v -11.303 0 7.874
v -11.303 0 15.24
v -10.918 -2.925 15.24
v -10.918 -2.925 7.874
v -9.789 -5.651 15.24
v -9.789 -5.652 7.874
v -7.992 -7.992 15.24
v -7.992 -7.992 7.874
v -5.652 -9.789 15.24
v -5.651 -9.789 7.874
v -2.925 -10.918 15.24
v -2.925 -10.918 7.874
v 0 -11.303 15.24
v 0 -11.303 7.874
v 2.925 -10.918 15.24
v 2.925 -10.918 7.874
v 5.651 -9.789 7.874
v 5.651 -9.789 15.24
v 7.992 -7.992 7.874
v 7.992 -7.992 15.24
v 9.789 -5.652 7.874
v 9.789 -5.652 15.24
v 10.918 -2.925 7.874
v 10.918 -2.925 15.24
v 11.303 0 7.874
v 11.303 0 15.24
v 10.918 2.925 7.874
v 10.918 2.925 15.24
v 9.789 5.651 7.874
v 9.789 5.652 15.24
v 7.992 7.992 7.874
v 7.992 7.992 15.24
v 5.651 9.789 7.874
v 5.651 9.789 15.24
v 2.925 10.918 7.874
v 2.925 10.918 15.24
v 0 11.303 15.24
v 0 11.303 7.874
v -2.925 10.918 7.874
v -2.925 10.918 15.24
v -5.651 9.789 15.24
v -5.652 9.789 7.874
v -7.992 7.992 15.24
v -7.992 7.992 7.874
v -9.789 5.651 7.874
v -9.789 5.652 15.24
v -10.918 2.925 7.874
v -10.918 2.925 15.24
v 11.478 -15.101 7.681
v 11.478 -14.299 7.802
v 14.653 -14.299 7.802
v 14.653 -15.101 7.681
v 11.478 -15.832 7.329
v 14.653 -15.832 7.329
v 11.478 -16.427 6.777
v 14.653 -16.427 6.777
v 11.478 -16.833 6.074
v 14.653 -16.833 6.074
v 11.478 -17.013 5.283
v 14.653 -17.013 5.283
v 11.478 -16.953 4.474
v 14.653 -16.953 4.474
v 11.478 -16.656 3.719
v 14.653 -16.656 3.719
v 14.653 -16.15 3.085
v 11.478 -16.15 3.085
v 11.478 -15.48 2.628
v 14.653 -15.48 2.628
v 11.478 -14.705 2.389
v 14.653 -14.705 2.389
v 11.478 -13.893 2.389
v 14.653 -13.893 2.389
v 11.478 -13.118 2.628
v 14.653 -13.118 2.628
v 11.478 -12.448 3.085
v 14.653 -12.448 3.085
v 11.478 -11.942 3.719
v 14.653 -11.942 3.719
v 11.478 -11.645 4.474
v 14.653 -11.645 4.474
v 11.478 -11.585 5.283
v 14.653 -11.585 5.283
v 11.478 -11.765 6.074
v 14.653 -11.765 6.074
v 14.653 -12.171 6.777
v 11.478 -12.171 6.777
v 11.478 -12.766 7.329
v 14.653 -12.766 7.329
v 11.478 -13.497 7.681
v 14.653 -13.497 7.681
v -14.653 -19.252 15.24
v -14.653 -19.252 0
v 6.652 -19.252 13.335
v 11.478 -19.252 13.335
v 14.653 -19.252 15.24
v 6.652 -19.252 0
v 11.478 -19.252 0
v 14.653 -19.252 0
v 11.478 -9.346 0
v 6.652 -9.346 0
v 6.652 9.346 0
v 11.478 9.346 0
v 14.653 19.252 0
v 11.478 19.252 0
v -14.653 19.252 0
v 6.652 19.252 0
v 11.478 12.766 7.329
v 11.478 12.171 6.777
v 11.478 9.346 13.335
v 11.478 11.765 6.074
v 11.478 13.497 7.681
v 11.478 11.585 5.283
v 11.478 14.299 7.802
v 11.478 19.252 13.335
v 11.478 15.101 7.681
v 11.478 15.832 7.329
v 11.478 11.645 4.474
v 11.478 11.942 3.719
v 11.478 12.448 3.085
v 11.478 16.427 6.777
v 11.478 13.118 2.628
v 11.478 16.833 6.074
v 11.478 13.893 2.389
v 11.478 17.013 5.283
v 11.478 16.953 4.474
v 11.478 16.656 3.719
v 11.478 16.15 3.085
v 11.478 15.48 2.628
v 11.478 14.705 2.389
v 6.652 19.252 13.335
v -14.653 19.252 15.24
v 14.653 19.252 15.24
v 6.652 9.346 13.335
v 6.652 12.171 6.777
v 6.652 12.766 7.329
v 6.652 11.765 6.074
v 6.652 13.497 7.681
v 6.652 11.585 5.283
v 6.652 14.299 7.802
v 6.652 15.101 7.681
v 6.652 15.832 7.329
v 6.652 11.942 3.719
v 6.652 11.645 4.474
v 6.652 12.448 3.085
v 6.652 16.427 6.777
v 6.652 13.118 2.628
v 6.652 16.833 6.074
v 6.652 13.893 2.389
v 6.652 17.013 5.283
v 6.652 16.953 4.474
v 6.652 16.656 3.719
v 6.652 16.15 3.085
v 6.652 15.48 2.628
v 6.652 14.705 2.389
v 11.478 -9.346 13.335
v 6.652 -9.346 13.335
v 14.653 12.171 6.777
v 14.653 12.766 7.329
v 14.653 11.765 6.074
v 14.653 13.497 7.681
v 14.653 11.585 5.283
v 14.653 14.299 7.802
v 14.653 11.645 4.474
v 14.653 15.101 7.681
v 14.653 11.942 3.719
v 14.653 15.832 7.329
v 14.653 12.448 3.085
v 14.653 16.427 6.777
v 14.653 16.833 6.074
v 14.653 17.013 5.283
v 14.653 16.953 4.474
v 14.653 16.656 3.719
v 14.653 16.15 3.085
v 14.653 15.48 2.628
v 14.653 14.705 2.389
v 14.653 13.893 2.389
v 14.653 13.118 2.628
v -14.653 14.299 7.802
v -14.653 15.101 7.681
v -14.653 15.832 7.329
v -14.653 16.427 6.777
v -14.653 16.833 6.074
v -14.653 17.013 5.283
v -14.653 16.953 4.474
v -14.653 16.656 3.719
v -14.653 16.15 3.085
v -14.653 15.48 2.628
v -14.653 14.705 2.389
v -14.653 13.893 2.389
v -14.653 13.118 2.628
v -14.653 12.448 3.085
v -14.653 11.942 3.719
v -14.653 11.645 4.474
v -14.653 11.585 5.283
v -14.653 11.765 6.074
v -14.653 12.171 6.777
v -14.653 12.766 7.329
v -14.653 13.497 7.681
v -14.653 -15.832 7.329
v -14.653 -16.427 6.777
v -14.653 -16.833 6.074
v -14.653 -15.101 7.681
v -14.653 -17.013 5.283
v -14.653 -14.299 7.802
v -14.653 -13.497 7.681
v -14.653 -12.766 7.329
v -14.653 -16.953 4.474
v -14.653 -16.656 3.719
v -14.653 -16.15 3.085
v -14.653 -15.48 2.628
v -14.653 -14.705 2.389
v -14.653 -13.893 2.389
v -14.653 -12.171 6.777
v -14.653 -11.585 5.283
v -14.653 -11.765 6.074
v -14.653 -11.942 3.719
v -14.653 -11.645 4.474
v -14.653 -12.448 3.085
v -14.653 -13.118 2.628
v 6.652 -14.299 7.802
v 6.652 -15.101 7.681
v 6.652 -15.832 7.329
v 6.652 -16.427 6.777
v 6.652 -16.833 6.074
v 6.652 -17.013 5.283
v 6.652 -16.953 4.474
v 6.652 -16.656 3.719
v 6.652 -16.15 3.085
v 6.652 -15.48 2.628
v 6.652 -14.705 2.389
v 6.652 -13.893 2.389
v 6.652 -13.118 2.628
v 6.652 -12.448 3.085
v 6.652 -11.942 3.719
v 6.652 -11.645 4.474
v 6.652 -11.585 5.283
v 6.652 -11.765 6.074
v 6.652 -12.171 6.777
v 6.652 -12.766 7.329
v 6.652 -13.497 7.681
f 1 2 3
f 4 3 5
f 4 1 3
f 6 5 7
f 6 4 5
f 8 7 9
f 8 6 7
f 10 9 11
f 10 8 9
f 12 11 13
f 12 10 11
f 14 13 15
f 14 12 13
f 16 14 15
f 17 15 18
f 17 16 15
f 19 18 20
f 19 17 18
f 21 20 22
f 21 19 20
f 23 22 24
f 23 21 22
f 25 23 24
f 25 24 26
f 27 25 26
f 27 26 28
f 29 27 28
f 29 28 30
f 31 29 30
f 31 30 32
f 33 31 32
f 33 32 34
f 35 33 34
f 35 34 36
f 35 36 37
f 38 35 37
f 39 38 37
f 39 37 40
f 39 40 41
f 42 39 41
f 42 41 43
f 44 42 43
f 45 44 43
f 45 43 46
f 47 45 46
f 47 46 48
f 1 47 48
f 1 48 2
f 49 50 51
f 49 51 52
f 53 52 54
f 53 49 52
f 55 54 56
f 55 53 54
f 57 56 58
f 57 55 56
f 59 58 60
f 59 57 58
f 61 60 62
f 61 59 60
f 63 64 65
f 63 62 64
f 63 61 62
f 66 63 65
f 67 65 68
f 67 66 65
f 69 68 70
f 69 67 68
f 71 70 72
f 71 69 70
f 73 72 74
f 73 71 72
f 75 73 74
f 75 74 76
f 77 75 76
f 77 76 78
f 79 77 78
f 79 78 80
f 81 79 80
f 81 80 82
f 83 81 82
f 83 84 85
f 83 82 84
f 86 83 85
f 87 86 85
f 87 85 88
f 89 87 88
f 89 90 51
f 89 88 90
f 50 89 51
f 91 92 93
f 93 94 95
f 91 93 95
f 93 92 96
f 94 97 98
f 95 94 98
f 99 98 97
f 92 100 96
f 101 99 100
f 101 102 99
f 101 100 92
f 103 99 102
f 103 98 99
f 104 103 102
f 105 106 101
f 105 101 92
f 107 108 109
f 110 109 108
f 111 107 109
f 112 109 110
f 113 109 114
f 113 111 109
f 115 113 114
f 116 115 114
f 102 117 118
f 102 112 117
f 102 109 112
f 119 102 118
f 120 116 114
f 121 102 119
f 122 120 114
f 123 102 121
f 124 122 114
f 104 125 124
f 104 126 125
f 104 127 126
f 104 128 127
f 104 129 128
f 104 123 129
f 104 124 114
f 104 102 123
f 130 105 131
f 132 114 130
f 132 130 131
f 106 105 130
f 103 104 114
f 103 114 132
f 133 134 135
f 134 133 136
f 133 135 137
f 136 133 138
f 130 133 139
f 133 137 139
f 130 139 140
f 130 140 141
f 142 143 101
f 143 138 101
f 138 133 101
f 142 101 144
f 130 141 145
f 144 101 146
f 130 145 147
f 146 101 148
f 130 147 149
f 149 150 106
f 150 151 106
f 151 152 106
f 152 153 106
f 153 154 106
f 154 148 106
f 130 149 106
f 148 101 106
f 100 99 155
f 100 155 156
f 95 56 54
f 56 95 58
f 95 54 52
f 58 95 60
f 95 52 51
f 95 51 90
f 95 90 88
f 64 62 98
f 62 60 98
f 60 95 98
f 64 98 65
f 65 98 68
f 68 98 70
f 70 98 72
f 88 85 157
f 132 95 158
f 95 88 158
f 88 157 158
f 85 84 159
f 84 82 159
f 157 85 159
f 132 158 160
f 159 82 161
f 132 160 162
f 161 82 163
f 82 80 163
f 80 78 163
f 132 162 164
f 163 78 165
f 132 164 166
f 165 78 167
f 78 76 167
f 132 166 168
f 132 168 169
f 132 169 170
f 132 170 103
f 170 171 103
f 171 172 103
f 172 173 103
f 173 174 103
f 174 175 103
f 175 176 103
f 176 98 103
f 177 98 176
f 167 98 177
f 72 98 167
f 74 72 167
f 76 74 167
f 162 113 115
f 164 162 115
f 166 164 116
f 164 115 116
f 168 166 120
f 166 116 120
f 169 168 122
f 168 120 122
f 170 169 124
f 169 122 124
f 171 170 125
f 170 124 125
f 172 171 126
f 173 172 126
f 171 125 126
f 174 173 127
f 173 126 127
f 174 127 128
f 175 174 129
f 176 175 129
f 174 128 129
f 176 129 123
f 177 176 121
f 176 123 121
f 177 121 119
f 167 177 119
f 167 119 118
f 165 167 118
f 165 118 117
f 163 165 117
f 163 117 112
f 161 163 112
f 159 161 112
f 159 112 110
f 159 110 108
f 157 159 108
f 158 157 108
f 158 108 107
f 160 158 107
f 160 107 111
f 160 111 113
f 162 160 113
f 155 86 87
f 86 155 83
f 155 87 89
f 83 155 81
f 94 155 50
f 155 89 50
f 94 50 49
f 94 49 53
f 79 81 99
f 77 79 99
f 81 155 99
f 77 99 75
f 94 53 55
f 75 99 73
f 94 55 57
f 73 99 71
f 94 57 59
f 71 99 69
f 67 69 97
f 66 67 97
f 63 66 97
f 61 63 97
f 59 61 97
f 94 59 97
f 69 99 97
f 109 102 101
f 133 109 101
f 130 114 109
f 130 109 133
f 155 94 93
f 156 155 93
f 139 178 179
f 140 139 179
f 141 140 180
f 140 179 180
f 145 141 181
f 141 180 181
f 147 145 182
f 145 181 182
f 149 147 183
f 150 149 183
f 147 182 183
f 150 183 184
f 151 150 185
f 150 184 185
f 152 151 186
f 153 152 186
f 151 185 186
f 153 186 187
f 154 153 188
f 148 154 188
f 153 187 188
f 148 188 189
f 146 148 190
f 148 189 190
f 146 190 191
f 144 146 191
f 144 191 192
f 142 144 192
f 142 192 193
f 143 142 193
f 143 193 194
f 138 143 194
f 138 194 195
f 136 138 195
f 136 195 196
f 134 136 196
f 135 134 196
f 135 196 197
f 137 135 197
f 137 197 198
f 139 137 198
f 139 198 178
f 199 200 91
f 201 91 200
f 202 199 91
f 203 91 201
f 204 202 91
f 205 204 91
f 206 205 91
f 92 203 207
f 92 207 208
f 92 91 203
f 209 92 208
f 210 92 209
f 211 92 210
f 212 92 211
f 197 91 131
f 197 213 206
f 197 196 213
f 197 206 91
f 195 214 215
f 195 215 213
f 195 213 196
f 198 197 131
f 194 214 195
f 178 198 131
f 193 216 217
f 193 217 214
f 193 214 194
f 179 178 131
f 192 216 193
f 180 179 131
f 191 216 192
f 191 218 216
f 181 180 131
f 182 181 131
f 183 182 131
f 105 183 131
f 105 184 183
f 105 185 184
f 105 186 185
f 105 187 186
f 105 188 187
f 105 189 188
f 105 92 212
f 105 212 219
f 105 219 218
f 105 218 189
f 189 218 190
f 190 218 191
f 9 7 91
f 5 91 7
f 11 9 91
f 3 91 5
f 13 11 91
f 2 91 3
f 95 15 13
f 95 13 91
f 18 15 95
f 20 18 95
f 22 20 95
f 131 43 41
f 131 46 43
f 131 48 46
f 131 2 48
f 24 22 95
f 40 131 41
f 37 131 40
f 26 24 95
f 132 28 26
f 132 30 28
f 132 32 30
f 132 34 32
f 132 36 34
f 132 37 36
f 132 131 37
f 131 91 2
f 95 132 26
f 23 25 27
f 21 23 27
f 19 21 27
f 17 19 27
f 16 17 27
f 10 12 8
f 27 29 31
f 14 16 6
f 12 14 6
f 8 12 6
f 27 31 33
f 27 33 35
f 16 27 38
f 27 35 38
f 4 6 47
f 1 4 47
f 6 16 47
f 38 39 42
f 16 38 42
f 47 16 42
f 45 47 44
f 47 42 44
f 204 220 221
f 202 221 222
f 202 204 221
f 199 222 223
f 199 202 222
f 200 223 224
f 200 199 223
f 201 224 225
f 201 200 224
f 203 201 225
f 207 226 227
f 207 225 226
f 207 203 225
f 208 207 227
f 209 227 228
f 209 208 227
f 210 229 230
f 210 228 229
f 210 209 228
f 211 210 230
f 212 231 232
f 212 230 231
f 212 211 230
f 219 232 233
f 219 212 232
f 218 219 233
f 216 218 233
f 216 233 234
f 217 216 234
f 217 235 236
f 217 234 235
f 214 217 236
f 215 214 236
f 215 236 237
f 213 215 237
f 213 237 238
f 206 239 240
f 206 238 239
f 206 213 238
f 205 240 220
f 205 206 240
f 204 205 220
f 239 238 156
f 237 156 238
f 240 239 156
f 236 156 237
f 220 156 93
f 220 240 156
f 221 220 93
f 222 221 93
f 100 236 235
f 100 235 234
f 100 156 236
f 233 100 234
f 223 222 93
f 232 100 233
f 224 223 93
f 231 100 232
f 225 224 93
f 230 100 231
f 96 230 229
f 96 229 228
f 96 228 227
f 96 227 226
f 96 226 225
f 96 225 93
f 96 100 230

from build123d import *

# Parameters (mm, degrees)
SKETCH1_W           = 29.306429484
SKETCH1_H           = 38.503943882
SKETCH1_R           = 11.303
BOSS_EXTRUDE1_DEPTH = 15.24
SKETCH4_W           = 4.826
SKETCH4_H           = 9.906
CUT_EXTRUDE1_DEPTH  = 13.335
SKETCH5_R           = 11.303
BOSS_EXTRUDE3_DEPTH = 7.874
SKETCH6_R           = 2.721770122
CUT_EXTRUDE2_DEPTH  = 31.75


with BuildPart() as part:
    # Sketch1 → Boss-Extrude1 (new body)
    with BuildSketch(Plane.XY):
        Rectangle(SKETCH1_W, SKETCH1_H)
        with Locations(Location((0, 0, 0), (0, 0, 180))):
            Circle(SKETCH1_R, mode=Mode.SUBTRACT)
    extrude(amount=BOSS_EXTRUDE1_DEPTH)

    # Sketch4 → Cut-Extrude1 (cut)
    with BuildSketch(Plane(origin=(0, 0, 0), x_dir=(-1, 0, 0), z_dir=(0, 0, -1))):
        with Locations((-9.065214742, 14.298971941)):
            Rectangle(SKETCH4_W, SKETCH4_H)
    cut_extrude1 = extrude(amount=-CUT_EXTRUDE1_DEPTH, mode=Mode.SUBTRACT)

    # Sketch5 → Boss-Extrude3 (add)
    with BuildSketch(Plane(origin=(0, 0, 0), x_dir=(-1, 0, 0), z_dir=(0, 0, -1))):
        Circle(SKETCH5_R)
    extrude(amount=-BOSS_EXTRUDE3_DEPTH)

    # Sketch6 → Cut-Extrude2 (cut)
    with BuildSketch(Plane.ZY.offset(14.653214742)):
        with Locations((5.08, 14.298971941)):
            Circle(SKETCH6_R)
    cut_extrude2 = extrude(amount=-CUT_EXTRUDE2_DEPTH, mode=Mode.SUBTRACT)

    # Mirror1: Cut-Extrude1, Cut-Extrude2 across plane
    add(cut_extrude1.mirror(Plane.ZX), mode=Mode.SUBTRACT)
    add(cut_extrude2.mirror(Plane.ZX), mode=Mode.SUBTRACT)


solid = part.part
